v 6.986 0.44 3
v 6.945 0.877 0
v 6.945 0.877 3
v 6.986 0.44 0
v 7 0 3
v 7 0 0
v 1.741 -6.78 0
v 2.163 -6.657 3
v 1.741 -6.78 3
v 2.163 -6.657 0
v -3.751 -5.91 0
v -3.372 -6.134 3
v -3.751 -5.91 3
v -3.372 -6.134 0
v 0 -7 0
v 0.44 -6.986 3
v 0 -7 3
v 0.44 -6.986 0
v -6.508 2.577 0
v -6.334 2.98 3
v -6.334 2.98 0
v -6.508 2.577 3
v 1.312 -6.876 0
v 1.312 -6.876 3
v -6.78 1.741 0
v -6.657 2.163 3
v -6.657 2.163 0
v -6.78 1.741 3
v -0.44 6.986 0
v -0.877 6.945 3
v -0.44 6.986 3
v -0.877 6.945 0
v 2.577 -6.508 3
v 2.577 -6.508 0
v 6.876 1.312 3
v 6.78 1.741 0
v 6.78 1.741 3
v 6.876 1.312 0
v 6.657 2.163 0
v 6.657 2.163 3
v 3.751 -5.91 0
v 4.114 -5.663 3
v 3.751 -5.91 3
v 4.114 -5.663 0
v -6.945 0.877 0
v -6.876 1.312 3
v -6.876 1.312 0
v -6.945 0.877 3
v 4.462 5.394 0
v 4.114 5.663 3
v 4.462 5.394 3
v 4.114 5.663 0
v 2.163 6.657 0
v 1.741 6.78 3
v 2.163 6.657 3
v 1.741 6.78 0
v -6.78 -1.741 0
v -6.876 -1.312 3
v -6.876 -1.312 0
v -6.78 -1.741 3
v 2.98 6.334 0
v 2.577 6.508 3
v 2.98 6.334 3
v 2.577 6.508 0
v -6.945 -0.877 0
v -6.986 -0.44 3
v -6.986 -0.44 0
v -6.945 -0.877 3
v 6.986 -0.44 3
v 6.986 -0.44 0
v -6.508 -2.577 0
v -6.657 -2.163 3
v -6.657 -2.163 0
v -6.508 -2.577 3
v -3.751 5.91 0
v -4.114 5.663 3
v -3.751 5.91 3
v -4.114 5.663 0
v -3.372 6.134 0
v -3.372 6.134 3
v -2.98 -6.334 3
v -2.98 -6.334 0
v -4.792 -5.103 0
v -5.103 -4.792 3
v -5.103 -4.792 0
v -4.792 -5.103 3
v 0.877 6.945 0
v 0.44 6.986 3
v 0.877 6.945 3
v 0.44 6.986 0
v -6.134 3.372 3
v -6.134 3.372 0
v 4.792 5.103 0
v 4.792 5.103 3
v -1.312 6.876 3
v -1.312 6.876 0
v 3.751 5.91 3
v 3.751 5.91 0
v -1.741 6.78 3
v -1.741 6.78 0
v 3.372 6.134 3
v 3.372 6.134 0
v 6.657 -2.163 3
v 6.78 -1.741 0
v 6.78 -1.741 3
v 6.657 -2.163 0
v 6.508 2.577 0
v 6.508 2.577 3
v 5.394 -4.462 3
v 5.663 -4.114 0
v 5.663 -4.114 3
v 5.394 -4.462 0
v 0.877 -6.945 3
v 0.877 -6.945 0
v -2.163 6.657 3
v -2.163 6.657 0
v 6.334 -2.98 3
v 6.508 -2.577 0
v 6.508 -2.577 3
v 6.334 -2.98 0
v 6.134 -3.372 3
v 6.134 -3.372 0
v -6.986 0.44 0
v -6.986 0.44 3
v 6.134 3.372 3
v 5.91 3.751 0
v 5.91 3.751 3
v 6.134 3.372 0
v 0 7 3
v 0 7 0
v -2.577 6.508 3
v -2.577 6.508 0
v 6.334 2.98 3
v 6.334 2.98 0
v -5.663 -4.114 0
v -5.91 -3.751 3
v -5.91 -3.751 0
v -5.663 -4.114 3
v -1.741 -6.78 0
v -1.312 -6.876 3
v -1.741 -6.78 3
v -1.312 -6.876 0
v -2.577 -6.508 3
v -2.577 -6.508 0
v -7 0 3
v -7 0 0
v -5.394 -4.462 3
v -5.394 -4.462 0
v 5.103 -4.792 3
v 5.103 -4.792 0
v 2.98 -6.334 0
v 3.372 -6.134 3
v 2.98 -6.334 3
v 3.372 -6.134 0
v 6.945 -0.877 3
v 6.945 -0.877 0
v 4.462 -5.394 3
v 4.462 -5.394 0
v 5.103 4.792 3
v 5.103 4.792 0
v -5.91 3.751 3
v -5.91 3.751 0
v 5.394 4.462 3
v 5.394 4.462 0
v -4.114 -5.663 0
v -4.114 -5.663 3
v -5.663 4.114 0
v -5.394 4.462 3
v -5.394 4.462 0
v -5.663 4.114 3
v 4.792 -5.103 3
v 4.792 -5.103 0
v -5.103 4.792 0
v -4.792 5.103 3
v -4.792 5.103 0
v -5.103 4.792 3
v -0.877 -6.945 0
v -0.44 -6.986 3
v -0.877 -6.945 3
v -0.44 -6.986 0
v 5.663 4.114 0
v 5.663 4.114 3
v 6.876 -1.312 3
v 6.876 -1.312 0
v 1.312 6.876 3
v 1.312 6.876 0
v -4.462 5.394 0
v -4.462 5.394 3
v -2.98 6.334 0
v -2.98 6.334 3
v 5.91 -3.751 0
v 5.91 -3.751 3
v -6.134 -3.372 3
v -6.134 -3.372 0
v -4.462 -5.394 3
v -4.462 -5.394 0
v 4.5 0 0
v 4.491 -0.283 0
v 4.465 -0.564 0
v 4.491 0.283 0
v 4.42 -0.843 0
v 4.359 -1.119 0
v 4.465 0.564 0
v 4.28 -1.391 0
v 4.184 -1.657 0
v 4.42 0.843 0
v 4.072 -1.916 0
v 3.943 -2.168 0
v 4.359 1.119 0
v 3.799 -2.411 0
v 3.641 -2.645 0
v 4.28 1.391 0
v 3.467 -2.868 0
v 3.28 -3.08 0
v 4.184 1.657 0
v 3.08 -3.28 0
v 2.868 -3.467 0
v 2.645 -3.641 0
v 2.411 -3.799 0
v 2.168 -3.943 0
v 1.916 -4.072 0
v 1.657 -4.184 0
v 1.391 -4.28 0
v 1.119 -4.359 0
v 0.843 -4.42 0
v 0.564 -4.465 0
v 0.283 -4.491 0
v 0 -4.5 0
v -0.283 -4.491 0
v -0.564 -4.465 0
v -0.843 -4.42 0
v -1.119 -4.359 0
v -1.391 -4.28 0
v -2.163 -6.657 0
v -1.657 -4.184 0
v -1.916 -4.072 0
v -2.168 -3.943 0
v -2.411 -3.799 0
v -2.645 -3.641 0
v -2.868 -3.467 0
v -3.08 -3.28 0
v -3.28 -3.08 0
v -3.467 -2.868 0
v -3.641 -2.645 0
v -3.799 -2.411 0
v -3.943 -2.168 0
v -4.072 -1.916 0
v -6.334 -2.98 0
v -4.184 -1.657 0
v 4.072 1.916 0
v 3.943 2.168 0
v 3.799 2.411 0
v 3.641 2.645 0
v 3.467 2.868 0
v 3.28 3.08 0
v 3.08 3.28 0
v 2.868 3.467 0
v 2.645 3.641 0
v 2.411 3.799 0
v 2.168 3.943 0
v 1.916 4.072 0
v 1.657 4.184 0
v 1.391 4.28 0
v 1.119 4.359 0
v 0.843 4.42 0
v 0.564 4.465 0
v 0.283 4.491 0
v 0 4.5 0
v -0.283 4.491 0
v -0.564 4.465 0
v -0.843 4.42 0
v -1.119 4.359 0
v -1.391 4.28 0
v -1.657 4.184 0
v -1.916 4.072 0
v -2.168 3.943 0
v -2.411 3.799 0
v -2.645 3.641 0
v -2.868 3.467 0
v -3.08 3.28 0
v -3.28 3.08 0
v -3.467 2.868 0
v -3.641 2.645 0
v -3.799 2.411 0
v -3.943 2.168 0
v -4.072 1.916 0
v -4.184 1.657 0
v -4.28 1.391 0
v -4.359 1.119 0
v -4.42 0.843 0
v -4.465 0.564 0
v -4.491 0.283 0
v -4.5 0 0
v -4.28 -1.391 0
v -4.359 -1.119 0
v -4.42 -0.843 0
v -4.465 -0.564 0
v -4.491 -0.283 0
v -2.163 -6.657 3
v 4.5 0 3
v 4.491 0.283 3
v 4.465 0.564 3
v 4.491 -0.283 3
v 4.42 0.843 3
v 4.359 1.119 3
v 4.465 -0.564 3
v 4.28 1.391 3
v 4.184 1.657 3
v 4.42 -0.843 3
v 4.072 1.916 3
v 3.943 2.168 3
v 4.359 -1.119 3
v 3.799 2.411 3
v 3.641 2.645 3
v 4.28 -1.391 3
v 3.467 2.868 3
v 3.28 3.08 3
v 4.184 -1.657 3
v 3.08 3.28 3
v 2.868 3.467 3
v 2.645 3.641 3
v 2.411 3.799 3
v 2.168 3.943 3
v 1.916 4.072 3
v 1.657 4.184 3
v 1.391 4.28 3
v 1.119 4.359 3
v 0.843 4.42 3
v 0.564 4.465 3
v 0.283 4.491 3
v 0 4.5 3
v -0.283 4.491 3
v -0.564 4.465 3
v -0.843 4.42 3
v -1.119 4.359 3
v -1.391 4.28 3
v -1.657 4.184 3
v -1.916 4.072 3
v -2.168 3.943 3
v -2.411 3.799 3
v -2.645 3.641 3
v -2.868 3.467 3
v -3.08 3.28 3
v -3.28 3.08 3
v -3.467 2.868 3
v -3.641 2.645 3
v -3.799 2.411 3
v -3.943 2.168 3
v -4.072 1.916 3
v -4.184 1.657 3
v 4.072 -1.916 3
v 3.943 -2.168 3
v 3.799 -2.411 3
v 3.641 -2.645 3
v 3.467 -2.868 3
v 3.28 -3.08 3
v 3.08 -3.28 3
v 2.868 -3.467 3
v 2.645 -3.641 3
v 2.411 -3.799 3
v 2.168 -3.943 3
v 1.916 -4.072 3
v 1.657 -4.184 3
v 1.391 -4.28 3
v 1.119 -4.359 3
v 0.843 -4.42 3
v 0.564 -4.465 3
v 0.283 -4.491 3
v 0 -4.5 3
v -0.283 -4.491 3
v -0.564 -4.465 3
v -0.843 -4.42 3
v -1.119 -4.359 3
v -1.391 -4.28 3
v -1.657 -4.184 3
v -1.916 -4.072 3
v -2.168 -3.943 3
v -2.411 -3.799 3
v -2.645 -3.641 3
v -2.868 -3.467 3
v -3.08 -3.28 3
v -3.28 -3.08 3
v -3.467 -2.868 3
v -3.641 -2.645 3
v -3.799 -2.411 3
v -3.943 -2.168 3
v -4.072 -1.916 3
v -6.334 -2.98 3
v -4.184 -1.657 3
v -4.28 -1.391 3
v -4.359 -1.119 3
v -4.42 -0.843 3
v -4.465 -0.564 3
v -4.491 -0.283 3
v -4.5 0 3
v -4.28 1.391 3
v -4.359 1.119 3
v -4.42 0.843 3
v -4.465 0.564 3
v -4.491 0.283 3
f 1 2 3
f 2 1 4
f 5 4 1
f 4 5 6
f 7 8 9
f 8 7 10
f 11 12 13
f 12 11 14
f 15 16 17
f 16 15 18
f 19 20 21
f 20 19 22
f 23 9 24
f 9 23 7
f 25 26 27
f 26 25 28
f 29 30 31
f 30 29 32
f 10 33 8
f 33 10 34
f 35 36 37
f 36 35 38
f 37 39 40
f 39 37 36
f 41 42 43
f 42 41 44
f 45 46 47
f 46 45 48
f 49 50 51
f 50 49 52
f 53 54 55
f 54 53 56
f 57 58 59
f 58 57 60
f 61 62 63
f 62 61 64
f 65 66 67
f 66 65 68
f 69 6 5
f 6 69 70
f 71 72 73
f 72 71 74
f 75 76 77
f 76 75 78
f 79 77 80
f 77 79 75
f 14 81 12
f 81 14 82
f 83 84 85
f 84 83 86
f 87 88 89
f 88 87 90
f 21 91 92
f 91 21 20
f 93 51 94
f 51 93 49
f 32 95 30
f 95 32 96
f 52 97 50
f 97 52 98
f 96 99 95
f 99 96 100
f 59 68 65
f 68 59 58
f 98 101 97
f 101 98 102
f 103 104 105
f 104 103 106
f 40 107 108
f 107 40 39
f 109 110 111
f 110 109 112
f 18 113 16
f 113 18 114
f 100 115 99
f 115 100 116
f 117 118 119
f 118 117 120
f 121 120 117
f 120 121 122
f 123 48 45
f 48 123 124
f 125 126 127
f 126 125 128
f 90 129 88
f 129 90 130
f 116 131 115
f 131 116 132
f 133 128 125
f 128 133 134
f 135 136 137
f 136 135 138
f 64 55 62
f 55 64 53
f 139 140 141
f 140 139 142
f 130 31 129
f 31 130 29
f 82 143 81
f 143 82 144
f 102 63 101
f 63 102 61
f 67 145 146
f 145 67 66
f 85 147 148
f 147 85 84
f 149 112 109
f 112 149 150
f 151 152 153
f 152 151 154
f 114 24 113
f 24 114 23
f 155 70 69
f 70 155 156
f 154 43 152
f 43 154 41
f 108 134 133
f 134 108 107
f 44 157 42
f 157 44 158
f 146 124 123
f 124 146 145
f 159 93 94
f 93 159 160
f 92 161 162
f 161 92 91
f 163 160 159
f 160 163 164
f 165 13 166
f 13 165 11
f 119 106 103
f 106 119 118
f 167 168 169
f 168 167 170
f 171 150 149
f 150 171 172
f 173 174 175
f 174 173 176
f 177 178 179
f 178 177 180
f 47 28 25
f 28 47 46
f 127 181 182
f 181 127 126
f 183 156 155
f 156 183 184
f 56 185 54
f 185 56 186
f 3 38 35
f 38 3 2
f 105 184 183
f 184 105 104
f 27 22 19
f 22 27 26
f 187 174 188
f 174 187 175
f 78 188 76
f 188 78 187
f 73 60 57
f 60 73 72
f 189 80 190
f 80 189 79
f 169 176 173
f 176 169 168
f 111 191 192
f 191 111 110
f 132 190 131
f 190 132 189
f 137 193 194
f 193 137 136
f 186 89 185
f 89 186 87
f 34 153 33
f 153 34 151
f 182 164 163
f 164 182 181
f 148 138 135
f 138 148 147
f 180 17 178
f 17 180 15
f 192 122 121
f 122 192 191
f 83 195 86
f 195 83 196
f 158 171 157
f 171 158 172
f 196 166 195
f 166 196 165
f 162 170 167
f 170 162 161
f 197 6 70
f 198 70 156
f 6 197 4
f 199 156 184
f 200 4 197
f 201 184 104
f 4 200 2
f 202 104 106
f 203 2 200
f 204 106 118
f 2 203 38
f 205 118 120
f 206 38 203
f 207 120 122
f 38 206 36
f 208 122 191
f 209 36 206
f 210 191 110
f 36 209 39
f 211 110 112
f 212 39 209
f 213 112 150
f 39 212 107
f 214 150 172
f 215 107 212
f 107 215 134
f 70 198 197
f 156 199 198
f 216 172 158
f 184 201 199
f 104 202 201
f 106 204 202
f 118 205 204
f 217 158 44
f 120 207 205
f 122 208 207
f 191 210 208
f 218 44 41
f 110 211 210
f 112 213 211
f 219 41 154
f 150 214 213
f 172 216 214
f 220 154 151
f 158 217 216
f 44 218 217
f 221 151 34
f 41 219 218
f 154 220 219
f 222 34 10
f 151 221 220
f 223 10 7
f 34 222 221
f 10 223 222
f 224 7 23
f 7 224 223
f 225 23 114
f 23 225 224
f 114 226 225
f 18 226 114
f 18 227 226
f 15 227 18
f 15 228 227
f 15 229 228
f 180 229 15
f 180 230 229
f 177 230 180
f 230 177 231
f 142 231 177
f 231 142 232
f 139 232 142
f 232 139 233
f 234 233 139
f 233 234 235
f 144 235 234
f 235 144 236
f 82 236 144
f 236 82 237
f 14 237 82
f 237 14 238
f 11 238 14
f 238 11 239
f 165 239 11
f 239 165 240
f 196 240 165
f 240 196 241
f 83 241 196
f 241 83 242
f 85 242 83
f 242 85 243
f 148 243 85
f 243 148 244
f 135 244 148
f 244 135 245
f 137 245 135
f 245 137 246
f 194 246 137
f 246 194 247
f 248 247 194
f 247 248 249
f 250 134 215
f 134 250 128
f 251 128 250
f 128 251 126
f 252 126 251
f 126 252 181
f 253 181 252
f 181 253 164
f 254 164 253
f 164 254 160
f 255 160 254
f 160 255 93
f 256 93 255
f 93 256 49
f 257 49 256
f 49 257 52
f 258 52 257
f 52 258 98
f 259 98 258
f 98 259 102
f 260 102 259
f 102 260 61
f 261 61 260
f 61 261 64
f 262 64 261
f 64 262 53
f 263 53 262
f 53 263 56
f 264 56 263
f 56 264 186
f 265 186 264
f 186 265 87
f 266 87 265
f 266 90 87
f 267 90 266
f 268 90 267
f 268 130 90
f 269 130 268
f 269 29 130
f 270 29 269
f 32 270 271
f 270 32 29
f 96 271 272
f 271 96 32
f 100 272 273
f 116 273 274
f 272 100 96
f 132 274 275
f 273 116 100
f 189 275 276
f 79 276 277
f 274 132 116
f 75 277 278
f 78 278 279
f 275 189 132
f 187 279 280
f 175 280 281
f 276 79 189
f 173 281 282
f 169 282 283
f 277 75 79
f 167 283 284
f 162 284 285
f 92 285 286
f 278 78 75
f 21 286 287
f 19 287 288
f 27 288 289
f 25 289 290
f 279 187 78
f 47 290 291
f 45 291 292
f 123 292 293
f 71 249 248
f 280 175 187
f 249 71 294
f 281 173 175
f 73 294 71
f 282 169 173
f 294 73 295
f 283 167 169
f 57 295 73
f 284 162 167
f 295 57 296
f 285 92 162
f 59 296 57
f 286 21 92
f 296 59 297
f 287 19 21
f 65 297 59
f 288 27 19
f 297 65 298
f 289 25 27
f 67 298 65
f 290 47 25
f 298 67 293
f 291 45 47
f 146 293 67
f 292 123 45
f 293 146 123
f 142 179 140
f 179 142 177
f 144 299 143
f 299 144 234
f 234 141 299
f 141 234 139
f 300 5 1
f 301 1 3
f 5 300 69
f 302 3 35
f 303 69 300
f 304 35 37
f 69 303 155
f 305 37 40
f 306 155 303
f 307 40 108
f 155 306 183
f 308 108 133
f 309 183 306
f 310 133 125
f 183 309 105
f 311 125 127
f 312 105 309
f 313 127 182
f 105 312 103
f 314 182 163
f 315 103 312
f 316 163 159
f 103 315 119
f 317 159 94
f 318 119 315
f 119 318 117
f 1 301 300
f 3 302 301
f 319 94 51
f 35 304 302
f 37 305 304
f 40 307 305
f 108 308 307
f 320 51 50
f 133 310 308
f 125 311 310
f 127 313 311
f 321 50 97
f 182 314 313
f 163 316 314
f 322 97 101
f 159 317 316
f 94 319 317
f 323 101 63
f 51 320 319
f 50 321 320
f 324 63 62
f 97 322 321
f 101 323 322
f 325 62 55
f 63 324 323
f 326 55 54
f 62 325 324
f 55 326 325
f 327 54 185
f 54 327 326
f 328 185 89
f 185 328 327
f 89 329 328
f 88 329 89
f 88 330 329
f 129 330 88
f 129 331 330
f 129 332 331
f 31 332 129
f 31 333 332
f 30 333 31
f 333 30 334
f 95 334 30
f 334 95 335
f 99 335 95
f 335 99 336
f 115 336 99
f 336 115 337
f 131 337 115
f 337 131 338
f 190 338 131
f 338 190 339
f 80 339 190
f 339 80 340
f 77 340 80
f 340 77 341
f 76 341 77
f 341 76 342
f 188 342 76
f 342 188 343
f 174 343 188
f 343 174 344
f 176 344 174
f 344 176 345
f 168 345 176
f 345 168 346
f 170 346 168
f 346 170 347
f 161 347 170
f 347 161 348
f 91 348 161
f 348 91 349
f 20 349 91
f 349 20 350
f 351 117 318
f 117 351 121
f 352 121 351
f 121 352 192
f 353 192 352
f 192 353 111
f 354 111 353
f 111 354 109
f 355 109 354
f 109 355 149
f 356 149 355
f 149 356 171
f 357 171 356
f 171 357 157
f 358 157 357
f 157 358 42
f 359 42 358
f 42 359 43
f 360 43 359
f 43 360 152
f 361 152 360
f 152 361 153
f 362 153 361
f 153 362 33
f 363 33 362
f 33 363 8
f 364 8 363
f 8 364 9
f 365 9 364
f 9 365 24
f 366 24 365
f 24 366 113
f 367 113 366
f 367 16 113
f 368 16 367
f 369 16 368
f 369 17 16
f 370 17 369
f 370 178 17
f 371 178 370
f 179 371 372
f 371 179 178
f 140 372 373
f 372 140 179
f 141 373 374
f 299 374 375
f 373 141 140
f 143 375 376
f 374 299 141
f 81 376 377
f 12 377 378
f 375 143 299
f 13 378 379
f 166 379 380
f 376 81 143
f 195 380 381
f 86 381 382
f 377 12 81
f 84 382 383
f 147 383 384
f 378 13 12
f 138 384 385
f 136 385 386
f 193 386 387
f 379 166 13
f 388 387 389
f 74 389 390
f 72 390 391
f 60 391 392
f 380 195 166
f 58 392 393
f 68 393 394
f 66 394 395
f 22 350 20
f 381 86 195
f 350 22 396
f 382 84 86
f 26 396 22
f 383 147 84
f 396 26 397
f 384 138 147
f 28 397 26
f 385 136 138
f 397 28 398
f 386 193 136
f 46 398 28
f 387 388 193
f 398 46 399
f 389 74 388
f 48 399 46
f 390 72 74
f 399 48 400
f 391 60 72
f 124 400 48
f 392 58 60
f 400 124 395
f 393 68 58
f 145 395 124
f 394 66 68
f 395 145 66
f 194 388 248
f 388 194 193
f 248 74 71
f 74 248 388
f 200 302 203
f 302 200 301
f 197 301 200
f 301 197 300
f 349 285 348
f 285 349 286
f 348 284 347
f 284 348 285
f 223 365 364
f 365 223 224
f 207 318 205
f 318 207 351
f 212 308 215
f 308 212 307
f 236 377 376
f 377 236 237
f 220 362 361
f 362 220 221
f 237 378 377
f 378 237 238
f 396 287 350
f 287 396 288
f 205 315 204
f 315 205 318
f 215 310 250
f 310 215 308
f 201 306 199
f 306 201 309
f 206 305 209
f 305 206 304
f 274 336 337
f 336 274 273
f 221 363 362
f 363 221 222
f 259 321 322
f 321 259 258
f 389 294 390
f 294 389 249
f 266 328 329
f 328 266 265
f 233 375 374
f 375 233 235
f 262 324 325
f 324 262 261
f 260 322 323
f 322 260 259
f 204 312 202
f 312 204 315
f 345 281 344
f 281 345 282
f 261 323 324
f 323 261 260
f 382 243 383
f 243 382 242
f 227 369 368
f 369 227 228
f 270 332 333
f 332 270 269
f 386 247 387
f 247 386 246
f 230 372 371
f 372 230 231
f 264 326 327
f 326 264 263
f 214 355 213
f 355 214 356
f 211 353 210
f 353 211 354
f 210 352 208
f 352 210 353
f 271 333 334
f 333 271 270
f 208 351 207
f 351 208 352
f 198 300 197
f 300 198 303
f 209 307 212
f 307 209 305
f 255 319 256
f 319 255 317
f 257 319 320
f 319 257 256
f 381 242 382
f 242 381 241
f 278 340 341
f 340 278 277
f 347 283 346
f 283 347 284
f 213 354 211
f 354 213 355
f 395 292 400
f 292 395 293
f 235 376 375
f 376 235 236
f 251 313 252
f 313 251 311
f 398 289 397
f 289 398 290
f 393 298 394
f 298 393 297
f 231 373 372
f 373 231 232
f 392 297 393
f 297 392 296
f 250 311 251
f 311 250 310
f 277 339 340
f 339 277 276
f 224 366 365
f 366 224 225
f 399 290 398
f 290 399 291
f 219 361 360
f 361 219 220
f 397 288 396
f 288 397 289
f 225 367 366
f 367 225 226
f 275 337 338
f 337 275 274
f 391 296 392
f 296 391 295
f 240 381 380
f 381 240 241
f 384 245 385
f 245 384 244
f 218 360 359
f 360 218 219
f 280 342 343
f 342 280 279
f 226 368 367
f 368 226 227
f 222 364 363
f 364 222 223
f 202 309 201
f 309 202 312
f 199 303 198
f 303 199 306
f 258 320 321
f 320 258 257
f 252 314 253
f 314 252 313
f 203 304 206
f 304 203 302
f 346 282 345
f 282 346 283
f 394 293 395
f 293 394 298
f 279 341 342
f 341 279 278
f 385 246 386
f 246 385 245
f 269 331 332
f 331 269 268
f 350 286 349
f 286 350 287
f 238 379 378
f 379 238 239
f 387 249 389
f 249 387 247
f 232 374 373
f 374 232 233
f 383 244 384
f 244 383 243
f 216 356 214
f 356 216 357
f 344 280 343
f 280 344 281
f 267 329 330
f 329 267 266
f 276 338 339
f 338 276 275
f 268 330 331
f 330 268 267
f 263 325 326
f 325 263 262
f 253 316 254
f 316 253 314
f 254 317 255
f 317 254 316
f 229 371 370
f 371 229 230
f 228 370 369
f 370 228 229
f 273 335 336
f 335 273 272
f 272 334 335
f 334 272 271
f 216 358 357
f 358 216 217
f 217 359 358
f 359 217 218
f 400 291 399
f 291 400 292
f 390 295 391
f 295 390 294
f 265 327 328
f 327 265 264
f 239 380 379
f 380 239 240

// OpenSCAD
openCylinder();

module openCylinder(height = 3,
                    outerRadius = 7,
                    innerRadius = 4.5,
                    fn = 100)
{
    $fn = fn;
        
    difference()
    {
        cylinder(r=outerRadius,
                 h=height);
        
        
        translate([0, 0, -1])
        cylinder(r=innerRadius,
                 h=height+1.01);
    }
}
